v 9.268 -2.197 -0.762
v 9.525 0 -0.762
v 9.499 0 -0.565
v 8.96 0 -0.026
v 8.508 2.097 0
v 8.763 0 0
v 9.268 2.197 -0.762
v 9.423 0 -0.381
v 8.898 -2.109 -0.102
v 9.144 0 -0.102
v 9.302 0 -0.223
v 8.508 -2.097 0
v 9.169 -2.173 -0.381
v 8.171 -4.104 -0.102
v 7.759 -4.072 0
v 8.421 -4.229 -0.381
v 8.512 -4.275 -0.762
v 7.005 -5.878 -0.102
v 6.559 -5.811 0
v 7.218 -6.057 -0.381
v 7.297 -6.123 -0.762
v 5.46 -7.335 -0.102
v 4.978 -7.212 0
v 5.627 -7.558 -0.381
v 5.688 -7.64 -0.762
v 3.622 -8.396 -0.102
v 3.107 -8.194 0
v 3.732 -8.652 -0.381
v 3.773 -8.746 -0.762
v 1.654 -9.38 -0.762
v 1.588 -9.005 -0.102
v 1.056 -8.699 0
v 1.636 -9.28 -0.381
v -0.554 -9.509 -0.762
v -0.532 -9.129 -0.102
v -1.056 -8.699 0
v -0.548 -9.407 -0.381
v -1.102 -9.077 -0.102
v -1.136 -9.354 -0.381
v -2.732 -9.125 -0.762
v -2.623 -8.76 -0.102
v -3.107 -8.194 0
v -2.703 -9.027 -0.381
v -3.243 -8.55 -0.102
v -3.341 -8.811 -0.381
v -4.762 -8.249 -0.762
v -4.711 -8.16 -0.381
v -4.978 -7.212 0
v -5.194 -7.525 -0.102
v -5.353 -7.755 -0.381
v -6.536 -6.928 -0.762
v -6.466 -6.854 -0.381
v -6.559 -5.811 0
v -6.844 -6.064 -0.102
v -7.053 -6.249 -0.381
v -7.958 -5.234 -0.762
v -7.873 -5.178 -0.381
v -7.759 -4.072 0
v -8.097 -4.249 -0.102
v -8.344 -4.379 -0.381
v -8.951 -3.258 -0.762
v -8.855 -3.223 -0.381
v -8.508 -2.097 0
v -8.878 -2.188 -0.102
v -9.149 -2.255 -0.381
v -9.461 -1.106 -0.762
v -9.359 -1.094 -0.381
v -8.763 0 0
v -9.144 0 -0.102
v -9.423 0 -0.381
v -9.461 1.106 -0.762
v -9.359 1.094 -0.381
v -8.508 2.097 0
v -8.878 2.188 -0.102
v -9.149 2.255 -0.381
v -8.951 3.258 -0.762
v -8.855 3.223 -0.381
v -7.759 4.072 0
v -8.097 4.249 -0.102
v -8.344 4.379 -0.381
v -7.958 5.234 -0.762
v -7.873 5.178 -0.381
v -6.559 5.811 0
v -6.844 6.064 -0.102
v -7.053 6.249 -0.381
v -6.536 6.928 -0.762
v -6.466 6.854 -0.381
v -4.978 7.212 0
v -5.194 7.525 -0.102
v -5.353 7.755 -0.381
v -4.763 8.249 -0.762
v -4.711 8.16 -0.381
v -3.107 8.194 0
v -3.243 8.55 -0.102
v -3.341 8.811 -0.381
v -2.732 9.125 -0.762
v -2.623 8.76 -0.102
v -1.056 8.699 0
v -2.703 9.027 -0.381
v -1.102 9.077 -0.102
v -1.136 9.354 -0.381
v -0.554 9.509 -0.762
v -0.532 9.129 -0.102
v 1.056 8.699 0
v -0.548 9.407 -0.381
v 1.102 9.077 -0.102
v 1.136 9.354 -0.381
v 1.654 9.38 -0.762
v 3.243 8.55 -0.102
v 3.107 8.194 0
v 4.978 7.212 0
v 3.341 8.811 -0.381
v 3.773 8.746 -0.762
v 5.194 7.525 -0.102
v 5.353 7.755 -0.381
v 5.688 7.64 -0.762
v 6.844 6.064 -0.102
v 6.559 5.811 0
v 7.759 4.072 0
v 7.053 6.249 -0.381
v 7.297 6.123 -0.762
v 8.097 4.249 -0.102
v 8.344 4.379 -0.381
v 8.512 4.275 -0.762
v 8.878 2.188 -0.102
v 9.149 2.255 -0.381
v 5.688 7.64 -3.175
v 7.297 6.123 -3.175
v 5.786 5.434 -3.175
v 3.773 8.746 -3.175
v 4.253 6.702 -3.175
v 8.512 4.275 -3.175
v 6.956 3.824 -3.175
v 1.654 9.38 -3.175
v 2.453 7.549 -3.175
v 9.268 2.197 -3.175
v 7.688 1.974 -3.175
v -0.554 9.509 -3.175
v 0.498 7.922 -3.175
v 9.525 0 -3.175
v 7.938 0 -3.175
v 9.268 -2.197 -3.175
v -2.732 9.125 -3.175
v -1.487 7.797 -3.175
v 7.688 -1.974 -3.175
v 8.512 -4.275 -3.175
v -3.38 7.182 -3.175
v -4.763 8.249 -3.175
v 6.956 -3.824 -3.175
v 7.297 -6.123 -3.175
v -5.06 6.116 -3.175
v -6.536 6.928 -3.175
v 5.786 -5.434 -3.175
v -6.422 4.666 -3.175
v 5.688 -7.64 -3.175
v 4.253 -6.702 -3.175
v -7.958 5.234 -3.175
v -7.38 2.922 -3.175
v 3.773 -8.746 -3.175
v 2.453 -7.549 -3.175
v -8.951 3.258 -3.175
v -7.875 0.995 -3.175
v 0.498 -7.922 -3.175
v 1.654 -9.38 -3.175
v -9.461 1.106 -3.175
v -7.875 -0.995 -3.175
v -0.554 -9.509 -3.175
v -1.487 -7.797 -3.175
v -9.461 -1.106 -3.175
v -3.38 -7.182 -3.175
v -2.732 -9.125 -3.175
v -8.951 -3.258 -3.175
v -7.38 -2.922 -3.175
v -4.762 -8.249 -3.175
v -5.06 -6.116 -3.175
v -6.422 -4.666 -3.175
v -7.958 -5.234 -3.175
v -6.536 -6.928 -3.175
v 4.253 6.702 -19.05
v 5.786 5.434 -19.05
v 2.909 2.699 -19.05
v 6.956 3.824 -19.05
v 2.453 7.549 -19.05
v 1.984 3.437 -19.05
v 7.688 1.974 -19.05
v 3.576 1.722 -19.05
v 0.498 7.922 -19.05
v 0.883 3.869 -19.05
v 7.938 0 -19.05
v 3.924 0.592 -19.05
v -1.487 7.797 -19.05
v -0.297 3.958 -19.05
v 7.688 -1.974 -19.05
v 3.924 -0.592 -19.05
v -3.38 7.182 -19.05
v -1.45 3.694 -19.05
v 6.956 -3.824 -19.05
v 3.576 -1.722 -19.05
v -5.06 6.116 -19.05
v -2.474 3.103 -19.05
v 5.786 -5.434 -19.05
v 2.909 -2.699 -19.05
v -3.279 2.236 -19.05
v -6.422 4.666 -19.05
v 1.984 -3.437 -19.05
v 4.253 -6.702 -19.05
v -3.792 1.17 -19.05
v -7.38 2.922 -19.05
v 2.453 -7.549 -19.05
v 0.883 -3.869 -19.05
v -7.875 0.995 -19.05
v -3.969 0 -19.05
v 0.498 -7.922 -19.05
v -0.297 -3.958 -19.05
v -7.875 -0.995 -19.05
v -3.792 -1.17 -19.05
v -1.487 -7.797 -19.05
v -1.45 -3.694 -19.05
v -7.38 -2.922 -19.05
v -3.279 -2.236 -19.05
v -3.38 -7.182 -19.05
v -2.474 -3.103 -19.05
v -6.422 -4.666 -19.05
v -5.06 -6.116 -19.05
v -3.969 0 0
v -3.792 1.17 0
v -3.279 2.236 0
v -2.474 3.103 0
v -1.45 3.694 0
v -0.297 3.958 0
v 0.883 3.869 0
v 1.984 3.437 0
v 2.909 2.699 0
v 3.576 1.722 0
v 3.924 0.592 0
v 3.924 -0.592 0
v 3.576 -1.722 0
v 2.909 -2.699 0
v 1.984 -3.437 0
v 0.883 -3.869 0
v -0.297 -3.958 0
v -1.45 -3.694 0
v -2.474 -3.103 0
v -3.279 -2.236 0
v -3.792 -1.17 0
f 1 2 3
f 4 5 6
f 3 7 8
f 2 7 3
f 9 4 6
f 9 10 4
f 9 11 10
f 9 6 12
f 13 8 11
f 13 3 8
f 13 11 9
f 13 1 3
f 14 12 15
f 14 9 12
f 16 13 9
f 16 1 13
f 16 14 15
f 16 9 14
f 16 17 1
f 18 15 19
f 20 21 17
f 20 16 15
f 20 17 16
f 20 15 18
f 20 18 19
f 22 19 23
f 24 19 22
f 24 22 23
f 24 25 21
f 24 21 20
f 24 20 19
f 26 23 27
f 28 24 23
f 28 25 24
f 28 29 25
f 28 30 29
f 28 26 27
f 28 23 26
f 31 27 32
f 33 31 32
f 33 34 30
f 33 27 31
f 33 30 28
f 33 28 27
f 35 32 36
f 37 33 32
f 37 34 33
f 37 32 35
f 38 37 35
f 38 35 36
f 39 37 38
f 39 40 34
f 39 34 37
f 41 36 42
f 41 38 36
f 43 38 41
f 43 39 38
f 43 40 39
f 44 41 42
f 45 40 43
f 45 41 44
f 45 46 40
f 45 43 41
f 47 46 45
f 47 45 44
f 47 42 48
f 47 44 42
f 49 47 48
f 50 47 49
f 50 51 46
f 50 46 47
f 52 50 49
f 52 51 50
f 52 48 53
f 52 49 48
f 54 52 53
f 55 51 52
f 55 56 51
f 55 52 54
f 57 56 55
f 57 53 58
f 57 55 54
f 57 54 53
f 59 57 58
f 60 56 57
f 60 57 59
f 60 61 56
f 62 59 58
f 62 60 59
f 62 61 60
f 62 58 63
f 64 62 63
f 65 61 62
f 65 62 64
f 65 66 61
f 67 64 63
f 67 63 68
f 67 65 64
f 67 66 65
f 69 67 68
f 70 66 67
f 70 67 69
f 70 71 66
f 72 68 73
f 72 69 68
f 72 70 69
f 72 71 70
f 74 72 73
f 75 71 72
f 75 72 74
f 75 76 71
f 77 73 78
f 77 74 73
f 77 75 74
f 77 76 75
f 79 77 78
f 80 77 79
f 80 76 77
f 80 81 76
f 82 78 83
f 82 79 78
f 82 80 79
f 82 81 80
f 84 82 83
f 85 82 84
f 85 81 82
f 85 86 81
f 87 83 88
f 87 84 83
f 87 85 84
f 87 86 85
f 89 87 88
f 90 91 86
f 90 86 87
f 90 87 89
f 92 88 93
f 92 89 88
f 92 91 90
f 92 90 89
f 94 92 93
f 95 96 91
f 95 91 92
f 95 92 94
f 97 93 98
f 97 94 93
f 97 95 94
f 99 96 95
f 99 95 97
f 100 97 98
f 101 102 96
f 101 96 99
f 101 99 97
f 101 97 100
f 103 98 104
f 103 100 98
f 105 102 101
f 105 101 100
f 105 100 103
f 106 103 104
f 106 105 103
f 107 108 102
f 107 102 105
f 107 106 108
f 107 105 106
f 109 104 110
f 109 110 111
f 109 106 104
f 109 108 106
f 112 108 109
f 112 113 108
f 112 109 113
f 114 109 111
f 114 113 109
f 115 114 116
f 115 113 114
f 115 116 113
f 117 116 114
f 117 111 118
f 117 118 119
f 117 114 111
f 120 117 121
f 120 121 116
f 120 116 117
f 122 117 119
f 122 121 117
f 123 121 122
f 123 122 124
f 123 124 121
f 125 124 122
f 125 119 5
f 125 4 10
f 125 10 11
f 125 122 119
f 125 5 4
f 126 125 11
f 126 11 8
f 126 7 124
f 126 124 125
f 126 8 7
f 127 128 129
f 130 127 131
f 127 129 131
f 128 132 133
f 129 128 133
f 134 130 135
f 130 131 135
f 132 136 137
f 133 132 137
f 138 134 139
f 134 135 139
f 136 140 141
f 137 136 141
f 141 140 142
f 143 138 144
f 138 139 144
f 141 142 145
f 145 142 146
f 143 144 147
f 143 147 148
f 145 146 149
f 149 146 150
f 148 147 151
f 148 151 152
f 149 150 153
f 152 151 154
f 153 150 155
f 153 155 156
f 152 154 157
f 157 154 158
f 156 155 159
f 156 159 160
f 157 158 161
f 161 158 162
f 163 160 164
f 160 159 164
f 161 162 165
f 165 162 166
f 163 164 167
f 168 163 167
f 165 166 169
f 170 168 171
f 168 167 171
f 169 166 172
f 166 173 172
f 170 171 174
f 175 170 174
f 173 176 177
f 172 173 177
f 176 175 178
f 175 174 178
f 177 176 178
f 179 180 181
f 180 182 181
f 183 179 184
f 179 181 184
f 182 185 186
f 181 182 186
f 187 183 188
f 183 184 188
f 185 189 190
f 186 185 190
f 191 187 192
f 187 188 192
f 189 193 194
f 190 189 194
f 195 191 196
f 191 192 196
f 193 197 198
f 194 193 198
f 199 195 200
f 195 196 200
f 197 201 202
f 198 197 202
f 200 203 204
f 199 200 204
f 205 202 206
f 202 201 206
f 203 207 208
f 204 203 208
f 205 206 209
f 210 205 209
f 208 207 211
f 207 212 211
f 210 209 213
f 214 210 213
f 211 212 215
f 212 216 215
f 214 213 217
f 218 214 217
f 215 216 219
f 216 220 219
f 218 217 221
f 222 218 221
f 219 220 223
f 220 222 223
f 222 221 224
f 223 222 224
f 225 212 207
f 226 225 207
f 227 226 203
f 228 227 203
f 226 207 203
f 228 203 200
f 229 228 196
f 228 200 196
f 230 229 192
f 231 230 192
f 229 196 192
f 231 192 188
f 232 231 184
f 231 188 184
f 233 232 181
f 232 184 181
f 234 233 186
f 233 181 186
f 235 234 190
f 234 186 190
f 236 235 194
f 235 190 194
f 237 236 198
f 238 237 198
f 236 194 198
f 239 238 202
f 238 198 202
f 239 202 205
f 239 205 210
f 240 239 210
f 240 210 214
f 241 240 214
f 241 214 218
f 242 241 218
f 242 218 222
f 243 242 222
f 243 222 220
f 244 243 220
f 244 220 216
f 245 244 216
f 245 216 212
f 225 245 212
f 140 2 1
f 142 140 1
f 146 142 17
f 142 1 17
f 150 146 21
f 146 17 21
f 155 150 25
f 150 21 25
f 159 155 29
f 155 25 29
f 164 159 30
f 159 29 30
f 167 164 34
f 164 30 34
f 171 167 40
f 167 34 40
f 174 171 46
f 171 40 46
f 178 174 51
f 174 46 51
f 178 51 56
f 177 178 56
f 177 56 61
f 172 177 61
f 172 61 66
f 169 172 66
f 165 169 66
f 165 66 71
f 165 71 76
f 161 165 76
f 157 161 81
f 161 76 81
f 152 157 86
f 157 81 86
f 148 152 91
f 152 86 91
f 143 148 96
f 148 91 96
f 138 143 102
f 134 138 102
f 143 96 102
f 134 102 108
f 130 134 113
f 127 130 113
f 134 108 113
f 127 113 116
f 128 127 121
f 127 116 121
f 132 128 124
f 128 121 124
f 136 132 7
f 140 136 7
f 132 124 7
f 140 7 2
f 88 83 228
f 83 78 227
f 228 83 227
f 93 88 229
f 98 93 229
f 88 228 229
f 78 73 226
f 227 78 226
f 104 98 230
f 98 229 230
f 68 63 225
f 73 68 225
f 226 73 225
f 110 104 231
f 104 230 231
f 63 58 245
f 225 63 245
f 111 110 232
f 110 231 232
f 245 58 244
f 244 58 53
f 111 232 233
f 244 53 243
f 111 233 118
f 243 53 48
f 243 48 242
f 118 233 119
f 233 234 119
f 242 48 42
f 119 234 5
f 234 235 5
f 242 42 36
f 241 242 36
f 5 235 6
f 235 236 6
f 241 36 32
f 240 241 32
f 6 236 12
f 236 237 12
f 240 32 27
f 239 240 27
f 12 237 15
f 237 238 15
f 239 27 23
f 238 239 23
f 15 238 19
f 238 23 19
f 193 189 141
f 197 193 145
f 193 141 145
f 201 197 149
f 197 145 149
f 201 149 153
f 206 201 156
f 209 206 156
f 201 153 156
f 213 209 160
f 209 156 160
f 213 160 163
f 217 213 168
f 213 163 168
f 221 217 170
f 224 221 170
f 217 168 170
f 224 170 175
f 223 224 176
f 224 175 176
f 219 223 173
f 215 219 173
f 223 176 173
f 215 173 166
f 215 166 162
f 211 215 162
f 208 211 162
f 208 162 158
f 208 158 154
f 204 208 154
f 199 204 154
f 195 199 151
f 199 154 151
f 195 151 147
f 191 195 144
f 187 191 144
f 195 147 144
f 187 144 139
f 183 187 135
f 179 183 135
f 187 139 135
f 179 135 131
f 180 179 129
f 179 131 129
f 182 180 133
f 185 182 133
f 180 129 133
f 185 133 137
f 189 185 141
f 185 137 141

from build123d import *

# Parameters (mm, degrees)
F2_R = 0.762
F4_D = 7.9375


with BuildPart() as f1:
    # F0 (on Front) → F1 (revolve)
    with BuildSketch(Plane.XZ):
        Polygon((9.525, 0), (0, 0), (0, -19.05), (7.9375, -19.05), (7.9375, -3.175), (9.525, -3.175), align=None)
    revolve(axis=Axis((0, 0, -9.525), (0, 0, -1)))

    # F2
    f2_edges = [f1.edges().sort_by_distance(p)[0] for p in [
        (-9.525, 0, 0),
    ]]
    fillet(f2_edges, radius=F2_R)

    # F4 (through all)
    with Locations(Plane.XY):
        with Locations((0, 0)):
            Hole(F4_D / 2)


solid = f1.part
